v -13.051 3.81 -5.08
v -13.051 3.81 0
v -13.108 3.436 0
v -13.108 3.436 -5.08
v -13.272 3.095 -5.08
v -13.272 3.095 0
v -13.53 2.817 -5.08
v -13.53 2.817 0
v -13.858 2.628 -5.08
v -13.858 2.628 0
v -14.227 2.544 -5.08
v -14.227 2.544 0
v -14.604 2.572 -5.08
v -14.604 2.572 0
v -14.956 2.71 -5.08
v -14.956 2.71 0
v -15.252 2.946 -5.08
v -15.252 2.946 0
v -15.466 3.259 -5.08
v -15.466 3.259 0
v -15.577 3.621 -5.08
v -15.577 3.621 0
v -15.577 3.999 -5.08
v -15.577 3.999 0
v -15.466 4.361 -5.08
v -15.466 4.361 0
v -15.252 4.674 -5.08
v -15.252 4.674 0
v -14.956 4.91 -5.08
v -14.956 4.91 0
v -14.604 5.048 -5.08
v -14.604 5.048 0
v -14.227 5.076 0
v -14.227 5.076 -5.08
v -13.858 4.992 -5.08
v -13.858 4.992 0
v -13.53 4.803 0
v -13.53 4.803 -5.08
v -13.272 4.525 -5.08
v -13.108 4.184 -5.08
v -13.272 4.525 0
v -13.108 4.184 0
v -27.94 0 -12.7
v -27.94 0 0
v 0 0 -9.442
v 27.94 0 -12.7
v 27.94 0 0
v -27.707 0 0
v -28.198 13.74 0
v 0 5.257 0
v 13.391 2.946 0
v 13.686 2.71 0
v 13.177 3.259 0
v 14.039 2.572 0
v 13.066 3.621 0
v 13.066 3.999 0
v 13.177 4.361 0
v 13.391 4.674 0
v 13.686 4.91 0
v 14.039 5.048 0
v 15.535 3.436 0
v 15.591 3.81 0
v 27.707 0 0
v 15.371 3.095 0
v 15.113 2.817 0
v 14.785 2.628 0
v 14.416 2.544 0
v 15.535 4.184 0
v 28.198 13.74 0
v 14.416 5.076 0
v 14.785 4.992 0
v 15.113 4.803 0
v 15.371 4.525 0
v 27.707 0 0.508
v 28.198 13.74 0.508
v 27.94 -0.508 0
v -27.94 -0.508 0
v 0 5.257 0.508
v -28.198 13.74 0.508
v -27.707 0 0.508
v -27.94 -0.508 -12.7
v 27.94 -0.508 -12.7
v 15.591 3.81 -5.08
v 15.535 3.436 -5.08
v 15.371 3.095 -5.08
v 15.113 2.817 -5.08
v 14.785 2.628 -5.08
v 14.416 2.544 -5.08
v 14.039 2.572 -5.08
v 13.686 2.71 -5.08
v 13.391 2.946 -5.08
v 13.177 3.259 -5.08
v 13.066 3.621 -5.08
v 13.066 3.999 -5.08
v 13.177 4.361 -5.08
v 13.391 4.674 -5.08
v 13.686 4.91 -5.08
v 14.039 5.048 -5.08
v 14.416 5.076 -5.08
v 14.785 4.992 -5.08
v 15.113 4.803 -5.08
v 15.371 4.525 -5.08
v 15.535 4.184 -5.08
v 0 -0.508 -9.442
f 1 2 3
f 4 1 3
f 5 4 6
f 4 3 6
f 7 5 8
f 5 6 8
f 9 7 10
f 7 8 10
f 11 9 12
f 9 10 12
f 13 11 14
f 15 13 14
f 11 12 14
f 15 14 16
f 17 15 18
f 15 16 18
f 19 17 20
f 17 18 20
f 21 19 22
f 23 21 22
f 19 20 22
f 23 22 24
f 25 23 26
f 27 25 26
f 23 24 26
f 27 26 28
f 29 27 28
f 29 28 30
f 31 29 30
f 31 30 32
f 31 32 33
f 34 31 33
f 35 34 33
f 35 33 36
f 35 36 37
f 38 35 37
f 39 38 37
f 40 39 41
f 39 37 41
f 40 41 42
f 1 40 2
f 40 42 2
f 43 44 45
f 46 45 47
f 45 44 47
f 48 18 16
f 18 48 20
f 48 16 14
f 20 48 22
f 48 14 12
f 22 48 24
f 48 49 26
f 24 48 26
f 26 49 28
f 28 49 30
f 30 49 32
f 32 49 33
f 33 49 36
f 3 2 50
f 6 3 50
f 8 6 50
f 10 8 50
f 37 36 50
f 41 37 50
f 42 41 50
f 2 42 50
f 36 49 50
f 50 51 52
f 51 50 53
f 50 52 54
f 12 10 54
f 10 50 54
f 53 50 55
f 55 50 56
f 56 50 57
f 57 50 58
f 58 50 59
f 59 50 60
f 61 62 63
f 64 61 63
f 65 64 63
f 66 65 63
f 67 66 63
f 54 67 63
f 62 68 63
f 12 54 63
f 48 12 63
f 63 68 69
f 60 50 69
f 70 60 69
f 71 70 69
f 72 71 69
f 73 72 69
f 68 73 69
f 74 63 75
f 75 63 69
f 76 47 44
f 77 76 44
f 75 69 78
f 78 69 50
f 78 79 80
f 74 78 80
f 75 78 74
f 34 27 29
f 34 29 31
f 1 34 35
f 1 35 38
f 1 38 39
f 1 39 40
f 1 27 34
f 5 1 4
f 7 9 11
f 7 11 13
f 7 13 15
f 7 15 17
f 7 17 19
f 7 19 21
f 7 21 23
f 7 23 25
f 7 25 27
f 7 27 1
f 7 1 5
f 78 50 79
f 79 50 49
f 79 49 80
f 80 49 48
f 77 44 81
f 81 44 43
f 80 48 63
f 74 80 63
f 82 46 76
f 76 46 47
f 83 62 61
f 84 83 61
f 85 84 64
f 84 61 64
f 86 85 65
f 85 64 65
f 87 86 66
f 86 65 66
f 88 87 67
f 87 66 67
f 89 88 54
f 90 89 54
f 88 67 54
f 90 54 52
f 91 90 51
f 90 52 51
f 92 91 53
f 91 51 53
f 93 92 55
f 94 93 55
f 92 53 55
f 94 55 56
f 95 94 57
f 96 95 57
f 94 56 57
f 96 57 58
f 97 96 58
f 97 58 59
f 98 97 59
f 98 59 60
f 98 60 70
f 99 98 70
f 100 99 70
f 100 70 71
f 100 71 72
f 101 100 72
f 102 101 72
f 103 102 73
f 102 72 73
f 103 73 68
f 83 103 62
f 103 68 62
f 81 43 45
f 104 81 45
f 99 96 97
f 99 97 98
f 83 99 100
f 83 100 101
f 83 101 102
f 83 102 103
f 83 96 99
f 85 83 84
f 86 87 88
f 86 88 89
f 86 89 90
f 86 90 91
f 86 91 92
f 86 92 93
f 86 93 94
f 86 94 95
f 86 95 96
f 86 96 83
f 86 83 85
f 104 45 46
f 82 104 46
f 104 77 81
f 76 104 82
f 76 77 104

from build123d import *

# Parameters (mm, degrees)
F1_DEPTH = 0.508
F3_DEPTH = 0.508
F4_R     = 1.27
F5_DEPTH = 5.08


with BuildPart() as f1:
    # F0 (on Front) → F1 (new body)
    with BuildSketch(Plane.XZ):
        Polygon((0, -9.442327), (0, 0), (-27.94, 0), (-27.94, -12.7), align=None)
        Polygon((27.94, 0), (0, 0), (0, -9.442327), (27.94, -12.7), align=None)
    extrude(amount=F1_DEPTH)


with BuildPart() as f3:
    # F2 (on Top) → F3 (new body)
    with BuildSketch(Plane.XY):
        Polygon((0, 5.257474), (0, 0), (27.706835, 0), (28.197579, 13.74031), align=None)
        Polygon((-27.706835, 0), (0, 0), (0, 5.257474), (-28.197579, 13.74031), align=None)
    extrude(amount=F3_DEPTH)

    # F4 (on face) → F5 (join)
    with BuildSketch(Plane(origin=(0, 0, 0), x_dir=(1, 0, 0), z_dir=(0, 0, -1))):
        with Locations((-14.321494, -3.81)):
            Circle(F4_R)
        with Locations((14.321494, -3.81)):
            Circle(F4_R)
    extrude(amount=F5_DEPTH)


solid = Compound([f1.part, f3.part])
